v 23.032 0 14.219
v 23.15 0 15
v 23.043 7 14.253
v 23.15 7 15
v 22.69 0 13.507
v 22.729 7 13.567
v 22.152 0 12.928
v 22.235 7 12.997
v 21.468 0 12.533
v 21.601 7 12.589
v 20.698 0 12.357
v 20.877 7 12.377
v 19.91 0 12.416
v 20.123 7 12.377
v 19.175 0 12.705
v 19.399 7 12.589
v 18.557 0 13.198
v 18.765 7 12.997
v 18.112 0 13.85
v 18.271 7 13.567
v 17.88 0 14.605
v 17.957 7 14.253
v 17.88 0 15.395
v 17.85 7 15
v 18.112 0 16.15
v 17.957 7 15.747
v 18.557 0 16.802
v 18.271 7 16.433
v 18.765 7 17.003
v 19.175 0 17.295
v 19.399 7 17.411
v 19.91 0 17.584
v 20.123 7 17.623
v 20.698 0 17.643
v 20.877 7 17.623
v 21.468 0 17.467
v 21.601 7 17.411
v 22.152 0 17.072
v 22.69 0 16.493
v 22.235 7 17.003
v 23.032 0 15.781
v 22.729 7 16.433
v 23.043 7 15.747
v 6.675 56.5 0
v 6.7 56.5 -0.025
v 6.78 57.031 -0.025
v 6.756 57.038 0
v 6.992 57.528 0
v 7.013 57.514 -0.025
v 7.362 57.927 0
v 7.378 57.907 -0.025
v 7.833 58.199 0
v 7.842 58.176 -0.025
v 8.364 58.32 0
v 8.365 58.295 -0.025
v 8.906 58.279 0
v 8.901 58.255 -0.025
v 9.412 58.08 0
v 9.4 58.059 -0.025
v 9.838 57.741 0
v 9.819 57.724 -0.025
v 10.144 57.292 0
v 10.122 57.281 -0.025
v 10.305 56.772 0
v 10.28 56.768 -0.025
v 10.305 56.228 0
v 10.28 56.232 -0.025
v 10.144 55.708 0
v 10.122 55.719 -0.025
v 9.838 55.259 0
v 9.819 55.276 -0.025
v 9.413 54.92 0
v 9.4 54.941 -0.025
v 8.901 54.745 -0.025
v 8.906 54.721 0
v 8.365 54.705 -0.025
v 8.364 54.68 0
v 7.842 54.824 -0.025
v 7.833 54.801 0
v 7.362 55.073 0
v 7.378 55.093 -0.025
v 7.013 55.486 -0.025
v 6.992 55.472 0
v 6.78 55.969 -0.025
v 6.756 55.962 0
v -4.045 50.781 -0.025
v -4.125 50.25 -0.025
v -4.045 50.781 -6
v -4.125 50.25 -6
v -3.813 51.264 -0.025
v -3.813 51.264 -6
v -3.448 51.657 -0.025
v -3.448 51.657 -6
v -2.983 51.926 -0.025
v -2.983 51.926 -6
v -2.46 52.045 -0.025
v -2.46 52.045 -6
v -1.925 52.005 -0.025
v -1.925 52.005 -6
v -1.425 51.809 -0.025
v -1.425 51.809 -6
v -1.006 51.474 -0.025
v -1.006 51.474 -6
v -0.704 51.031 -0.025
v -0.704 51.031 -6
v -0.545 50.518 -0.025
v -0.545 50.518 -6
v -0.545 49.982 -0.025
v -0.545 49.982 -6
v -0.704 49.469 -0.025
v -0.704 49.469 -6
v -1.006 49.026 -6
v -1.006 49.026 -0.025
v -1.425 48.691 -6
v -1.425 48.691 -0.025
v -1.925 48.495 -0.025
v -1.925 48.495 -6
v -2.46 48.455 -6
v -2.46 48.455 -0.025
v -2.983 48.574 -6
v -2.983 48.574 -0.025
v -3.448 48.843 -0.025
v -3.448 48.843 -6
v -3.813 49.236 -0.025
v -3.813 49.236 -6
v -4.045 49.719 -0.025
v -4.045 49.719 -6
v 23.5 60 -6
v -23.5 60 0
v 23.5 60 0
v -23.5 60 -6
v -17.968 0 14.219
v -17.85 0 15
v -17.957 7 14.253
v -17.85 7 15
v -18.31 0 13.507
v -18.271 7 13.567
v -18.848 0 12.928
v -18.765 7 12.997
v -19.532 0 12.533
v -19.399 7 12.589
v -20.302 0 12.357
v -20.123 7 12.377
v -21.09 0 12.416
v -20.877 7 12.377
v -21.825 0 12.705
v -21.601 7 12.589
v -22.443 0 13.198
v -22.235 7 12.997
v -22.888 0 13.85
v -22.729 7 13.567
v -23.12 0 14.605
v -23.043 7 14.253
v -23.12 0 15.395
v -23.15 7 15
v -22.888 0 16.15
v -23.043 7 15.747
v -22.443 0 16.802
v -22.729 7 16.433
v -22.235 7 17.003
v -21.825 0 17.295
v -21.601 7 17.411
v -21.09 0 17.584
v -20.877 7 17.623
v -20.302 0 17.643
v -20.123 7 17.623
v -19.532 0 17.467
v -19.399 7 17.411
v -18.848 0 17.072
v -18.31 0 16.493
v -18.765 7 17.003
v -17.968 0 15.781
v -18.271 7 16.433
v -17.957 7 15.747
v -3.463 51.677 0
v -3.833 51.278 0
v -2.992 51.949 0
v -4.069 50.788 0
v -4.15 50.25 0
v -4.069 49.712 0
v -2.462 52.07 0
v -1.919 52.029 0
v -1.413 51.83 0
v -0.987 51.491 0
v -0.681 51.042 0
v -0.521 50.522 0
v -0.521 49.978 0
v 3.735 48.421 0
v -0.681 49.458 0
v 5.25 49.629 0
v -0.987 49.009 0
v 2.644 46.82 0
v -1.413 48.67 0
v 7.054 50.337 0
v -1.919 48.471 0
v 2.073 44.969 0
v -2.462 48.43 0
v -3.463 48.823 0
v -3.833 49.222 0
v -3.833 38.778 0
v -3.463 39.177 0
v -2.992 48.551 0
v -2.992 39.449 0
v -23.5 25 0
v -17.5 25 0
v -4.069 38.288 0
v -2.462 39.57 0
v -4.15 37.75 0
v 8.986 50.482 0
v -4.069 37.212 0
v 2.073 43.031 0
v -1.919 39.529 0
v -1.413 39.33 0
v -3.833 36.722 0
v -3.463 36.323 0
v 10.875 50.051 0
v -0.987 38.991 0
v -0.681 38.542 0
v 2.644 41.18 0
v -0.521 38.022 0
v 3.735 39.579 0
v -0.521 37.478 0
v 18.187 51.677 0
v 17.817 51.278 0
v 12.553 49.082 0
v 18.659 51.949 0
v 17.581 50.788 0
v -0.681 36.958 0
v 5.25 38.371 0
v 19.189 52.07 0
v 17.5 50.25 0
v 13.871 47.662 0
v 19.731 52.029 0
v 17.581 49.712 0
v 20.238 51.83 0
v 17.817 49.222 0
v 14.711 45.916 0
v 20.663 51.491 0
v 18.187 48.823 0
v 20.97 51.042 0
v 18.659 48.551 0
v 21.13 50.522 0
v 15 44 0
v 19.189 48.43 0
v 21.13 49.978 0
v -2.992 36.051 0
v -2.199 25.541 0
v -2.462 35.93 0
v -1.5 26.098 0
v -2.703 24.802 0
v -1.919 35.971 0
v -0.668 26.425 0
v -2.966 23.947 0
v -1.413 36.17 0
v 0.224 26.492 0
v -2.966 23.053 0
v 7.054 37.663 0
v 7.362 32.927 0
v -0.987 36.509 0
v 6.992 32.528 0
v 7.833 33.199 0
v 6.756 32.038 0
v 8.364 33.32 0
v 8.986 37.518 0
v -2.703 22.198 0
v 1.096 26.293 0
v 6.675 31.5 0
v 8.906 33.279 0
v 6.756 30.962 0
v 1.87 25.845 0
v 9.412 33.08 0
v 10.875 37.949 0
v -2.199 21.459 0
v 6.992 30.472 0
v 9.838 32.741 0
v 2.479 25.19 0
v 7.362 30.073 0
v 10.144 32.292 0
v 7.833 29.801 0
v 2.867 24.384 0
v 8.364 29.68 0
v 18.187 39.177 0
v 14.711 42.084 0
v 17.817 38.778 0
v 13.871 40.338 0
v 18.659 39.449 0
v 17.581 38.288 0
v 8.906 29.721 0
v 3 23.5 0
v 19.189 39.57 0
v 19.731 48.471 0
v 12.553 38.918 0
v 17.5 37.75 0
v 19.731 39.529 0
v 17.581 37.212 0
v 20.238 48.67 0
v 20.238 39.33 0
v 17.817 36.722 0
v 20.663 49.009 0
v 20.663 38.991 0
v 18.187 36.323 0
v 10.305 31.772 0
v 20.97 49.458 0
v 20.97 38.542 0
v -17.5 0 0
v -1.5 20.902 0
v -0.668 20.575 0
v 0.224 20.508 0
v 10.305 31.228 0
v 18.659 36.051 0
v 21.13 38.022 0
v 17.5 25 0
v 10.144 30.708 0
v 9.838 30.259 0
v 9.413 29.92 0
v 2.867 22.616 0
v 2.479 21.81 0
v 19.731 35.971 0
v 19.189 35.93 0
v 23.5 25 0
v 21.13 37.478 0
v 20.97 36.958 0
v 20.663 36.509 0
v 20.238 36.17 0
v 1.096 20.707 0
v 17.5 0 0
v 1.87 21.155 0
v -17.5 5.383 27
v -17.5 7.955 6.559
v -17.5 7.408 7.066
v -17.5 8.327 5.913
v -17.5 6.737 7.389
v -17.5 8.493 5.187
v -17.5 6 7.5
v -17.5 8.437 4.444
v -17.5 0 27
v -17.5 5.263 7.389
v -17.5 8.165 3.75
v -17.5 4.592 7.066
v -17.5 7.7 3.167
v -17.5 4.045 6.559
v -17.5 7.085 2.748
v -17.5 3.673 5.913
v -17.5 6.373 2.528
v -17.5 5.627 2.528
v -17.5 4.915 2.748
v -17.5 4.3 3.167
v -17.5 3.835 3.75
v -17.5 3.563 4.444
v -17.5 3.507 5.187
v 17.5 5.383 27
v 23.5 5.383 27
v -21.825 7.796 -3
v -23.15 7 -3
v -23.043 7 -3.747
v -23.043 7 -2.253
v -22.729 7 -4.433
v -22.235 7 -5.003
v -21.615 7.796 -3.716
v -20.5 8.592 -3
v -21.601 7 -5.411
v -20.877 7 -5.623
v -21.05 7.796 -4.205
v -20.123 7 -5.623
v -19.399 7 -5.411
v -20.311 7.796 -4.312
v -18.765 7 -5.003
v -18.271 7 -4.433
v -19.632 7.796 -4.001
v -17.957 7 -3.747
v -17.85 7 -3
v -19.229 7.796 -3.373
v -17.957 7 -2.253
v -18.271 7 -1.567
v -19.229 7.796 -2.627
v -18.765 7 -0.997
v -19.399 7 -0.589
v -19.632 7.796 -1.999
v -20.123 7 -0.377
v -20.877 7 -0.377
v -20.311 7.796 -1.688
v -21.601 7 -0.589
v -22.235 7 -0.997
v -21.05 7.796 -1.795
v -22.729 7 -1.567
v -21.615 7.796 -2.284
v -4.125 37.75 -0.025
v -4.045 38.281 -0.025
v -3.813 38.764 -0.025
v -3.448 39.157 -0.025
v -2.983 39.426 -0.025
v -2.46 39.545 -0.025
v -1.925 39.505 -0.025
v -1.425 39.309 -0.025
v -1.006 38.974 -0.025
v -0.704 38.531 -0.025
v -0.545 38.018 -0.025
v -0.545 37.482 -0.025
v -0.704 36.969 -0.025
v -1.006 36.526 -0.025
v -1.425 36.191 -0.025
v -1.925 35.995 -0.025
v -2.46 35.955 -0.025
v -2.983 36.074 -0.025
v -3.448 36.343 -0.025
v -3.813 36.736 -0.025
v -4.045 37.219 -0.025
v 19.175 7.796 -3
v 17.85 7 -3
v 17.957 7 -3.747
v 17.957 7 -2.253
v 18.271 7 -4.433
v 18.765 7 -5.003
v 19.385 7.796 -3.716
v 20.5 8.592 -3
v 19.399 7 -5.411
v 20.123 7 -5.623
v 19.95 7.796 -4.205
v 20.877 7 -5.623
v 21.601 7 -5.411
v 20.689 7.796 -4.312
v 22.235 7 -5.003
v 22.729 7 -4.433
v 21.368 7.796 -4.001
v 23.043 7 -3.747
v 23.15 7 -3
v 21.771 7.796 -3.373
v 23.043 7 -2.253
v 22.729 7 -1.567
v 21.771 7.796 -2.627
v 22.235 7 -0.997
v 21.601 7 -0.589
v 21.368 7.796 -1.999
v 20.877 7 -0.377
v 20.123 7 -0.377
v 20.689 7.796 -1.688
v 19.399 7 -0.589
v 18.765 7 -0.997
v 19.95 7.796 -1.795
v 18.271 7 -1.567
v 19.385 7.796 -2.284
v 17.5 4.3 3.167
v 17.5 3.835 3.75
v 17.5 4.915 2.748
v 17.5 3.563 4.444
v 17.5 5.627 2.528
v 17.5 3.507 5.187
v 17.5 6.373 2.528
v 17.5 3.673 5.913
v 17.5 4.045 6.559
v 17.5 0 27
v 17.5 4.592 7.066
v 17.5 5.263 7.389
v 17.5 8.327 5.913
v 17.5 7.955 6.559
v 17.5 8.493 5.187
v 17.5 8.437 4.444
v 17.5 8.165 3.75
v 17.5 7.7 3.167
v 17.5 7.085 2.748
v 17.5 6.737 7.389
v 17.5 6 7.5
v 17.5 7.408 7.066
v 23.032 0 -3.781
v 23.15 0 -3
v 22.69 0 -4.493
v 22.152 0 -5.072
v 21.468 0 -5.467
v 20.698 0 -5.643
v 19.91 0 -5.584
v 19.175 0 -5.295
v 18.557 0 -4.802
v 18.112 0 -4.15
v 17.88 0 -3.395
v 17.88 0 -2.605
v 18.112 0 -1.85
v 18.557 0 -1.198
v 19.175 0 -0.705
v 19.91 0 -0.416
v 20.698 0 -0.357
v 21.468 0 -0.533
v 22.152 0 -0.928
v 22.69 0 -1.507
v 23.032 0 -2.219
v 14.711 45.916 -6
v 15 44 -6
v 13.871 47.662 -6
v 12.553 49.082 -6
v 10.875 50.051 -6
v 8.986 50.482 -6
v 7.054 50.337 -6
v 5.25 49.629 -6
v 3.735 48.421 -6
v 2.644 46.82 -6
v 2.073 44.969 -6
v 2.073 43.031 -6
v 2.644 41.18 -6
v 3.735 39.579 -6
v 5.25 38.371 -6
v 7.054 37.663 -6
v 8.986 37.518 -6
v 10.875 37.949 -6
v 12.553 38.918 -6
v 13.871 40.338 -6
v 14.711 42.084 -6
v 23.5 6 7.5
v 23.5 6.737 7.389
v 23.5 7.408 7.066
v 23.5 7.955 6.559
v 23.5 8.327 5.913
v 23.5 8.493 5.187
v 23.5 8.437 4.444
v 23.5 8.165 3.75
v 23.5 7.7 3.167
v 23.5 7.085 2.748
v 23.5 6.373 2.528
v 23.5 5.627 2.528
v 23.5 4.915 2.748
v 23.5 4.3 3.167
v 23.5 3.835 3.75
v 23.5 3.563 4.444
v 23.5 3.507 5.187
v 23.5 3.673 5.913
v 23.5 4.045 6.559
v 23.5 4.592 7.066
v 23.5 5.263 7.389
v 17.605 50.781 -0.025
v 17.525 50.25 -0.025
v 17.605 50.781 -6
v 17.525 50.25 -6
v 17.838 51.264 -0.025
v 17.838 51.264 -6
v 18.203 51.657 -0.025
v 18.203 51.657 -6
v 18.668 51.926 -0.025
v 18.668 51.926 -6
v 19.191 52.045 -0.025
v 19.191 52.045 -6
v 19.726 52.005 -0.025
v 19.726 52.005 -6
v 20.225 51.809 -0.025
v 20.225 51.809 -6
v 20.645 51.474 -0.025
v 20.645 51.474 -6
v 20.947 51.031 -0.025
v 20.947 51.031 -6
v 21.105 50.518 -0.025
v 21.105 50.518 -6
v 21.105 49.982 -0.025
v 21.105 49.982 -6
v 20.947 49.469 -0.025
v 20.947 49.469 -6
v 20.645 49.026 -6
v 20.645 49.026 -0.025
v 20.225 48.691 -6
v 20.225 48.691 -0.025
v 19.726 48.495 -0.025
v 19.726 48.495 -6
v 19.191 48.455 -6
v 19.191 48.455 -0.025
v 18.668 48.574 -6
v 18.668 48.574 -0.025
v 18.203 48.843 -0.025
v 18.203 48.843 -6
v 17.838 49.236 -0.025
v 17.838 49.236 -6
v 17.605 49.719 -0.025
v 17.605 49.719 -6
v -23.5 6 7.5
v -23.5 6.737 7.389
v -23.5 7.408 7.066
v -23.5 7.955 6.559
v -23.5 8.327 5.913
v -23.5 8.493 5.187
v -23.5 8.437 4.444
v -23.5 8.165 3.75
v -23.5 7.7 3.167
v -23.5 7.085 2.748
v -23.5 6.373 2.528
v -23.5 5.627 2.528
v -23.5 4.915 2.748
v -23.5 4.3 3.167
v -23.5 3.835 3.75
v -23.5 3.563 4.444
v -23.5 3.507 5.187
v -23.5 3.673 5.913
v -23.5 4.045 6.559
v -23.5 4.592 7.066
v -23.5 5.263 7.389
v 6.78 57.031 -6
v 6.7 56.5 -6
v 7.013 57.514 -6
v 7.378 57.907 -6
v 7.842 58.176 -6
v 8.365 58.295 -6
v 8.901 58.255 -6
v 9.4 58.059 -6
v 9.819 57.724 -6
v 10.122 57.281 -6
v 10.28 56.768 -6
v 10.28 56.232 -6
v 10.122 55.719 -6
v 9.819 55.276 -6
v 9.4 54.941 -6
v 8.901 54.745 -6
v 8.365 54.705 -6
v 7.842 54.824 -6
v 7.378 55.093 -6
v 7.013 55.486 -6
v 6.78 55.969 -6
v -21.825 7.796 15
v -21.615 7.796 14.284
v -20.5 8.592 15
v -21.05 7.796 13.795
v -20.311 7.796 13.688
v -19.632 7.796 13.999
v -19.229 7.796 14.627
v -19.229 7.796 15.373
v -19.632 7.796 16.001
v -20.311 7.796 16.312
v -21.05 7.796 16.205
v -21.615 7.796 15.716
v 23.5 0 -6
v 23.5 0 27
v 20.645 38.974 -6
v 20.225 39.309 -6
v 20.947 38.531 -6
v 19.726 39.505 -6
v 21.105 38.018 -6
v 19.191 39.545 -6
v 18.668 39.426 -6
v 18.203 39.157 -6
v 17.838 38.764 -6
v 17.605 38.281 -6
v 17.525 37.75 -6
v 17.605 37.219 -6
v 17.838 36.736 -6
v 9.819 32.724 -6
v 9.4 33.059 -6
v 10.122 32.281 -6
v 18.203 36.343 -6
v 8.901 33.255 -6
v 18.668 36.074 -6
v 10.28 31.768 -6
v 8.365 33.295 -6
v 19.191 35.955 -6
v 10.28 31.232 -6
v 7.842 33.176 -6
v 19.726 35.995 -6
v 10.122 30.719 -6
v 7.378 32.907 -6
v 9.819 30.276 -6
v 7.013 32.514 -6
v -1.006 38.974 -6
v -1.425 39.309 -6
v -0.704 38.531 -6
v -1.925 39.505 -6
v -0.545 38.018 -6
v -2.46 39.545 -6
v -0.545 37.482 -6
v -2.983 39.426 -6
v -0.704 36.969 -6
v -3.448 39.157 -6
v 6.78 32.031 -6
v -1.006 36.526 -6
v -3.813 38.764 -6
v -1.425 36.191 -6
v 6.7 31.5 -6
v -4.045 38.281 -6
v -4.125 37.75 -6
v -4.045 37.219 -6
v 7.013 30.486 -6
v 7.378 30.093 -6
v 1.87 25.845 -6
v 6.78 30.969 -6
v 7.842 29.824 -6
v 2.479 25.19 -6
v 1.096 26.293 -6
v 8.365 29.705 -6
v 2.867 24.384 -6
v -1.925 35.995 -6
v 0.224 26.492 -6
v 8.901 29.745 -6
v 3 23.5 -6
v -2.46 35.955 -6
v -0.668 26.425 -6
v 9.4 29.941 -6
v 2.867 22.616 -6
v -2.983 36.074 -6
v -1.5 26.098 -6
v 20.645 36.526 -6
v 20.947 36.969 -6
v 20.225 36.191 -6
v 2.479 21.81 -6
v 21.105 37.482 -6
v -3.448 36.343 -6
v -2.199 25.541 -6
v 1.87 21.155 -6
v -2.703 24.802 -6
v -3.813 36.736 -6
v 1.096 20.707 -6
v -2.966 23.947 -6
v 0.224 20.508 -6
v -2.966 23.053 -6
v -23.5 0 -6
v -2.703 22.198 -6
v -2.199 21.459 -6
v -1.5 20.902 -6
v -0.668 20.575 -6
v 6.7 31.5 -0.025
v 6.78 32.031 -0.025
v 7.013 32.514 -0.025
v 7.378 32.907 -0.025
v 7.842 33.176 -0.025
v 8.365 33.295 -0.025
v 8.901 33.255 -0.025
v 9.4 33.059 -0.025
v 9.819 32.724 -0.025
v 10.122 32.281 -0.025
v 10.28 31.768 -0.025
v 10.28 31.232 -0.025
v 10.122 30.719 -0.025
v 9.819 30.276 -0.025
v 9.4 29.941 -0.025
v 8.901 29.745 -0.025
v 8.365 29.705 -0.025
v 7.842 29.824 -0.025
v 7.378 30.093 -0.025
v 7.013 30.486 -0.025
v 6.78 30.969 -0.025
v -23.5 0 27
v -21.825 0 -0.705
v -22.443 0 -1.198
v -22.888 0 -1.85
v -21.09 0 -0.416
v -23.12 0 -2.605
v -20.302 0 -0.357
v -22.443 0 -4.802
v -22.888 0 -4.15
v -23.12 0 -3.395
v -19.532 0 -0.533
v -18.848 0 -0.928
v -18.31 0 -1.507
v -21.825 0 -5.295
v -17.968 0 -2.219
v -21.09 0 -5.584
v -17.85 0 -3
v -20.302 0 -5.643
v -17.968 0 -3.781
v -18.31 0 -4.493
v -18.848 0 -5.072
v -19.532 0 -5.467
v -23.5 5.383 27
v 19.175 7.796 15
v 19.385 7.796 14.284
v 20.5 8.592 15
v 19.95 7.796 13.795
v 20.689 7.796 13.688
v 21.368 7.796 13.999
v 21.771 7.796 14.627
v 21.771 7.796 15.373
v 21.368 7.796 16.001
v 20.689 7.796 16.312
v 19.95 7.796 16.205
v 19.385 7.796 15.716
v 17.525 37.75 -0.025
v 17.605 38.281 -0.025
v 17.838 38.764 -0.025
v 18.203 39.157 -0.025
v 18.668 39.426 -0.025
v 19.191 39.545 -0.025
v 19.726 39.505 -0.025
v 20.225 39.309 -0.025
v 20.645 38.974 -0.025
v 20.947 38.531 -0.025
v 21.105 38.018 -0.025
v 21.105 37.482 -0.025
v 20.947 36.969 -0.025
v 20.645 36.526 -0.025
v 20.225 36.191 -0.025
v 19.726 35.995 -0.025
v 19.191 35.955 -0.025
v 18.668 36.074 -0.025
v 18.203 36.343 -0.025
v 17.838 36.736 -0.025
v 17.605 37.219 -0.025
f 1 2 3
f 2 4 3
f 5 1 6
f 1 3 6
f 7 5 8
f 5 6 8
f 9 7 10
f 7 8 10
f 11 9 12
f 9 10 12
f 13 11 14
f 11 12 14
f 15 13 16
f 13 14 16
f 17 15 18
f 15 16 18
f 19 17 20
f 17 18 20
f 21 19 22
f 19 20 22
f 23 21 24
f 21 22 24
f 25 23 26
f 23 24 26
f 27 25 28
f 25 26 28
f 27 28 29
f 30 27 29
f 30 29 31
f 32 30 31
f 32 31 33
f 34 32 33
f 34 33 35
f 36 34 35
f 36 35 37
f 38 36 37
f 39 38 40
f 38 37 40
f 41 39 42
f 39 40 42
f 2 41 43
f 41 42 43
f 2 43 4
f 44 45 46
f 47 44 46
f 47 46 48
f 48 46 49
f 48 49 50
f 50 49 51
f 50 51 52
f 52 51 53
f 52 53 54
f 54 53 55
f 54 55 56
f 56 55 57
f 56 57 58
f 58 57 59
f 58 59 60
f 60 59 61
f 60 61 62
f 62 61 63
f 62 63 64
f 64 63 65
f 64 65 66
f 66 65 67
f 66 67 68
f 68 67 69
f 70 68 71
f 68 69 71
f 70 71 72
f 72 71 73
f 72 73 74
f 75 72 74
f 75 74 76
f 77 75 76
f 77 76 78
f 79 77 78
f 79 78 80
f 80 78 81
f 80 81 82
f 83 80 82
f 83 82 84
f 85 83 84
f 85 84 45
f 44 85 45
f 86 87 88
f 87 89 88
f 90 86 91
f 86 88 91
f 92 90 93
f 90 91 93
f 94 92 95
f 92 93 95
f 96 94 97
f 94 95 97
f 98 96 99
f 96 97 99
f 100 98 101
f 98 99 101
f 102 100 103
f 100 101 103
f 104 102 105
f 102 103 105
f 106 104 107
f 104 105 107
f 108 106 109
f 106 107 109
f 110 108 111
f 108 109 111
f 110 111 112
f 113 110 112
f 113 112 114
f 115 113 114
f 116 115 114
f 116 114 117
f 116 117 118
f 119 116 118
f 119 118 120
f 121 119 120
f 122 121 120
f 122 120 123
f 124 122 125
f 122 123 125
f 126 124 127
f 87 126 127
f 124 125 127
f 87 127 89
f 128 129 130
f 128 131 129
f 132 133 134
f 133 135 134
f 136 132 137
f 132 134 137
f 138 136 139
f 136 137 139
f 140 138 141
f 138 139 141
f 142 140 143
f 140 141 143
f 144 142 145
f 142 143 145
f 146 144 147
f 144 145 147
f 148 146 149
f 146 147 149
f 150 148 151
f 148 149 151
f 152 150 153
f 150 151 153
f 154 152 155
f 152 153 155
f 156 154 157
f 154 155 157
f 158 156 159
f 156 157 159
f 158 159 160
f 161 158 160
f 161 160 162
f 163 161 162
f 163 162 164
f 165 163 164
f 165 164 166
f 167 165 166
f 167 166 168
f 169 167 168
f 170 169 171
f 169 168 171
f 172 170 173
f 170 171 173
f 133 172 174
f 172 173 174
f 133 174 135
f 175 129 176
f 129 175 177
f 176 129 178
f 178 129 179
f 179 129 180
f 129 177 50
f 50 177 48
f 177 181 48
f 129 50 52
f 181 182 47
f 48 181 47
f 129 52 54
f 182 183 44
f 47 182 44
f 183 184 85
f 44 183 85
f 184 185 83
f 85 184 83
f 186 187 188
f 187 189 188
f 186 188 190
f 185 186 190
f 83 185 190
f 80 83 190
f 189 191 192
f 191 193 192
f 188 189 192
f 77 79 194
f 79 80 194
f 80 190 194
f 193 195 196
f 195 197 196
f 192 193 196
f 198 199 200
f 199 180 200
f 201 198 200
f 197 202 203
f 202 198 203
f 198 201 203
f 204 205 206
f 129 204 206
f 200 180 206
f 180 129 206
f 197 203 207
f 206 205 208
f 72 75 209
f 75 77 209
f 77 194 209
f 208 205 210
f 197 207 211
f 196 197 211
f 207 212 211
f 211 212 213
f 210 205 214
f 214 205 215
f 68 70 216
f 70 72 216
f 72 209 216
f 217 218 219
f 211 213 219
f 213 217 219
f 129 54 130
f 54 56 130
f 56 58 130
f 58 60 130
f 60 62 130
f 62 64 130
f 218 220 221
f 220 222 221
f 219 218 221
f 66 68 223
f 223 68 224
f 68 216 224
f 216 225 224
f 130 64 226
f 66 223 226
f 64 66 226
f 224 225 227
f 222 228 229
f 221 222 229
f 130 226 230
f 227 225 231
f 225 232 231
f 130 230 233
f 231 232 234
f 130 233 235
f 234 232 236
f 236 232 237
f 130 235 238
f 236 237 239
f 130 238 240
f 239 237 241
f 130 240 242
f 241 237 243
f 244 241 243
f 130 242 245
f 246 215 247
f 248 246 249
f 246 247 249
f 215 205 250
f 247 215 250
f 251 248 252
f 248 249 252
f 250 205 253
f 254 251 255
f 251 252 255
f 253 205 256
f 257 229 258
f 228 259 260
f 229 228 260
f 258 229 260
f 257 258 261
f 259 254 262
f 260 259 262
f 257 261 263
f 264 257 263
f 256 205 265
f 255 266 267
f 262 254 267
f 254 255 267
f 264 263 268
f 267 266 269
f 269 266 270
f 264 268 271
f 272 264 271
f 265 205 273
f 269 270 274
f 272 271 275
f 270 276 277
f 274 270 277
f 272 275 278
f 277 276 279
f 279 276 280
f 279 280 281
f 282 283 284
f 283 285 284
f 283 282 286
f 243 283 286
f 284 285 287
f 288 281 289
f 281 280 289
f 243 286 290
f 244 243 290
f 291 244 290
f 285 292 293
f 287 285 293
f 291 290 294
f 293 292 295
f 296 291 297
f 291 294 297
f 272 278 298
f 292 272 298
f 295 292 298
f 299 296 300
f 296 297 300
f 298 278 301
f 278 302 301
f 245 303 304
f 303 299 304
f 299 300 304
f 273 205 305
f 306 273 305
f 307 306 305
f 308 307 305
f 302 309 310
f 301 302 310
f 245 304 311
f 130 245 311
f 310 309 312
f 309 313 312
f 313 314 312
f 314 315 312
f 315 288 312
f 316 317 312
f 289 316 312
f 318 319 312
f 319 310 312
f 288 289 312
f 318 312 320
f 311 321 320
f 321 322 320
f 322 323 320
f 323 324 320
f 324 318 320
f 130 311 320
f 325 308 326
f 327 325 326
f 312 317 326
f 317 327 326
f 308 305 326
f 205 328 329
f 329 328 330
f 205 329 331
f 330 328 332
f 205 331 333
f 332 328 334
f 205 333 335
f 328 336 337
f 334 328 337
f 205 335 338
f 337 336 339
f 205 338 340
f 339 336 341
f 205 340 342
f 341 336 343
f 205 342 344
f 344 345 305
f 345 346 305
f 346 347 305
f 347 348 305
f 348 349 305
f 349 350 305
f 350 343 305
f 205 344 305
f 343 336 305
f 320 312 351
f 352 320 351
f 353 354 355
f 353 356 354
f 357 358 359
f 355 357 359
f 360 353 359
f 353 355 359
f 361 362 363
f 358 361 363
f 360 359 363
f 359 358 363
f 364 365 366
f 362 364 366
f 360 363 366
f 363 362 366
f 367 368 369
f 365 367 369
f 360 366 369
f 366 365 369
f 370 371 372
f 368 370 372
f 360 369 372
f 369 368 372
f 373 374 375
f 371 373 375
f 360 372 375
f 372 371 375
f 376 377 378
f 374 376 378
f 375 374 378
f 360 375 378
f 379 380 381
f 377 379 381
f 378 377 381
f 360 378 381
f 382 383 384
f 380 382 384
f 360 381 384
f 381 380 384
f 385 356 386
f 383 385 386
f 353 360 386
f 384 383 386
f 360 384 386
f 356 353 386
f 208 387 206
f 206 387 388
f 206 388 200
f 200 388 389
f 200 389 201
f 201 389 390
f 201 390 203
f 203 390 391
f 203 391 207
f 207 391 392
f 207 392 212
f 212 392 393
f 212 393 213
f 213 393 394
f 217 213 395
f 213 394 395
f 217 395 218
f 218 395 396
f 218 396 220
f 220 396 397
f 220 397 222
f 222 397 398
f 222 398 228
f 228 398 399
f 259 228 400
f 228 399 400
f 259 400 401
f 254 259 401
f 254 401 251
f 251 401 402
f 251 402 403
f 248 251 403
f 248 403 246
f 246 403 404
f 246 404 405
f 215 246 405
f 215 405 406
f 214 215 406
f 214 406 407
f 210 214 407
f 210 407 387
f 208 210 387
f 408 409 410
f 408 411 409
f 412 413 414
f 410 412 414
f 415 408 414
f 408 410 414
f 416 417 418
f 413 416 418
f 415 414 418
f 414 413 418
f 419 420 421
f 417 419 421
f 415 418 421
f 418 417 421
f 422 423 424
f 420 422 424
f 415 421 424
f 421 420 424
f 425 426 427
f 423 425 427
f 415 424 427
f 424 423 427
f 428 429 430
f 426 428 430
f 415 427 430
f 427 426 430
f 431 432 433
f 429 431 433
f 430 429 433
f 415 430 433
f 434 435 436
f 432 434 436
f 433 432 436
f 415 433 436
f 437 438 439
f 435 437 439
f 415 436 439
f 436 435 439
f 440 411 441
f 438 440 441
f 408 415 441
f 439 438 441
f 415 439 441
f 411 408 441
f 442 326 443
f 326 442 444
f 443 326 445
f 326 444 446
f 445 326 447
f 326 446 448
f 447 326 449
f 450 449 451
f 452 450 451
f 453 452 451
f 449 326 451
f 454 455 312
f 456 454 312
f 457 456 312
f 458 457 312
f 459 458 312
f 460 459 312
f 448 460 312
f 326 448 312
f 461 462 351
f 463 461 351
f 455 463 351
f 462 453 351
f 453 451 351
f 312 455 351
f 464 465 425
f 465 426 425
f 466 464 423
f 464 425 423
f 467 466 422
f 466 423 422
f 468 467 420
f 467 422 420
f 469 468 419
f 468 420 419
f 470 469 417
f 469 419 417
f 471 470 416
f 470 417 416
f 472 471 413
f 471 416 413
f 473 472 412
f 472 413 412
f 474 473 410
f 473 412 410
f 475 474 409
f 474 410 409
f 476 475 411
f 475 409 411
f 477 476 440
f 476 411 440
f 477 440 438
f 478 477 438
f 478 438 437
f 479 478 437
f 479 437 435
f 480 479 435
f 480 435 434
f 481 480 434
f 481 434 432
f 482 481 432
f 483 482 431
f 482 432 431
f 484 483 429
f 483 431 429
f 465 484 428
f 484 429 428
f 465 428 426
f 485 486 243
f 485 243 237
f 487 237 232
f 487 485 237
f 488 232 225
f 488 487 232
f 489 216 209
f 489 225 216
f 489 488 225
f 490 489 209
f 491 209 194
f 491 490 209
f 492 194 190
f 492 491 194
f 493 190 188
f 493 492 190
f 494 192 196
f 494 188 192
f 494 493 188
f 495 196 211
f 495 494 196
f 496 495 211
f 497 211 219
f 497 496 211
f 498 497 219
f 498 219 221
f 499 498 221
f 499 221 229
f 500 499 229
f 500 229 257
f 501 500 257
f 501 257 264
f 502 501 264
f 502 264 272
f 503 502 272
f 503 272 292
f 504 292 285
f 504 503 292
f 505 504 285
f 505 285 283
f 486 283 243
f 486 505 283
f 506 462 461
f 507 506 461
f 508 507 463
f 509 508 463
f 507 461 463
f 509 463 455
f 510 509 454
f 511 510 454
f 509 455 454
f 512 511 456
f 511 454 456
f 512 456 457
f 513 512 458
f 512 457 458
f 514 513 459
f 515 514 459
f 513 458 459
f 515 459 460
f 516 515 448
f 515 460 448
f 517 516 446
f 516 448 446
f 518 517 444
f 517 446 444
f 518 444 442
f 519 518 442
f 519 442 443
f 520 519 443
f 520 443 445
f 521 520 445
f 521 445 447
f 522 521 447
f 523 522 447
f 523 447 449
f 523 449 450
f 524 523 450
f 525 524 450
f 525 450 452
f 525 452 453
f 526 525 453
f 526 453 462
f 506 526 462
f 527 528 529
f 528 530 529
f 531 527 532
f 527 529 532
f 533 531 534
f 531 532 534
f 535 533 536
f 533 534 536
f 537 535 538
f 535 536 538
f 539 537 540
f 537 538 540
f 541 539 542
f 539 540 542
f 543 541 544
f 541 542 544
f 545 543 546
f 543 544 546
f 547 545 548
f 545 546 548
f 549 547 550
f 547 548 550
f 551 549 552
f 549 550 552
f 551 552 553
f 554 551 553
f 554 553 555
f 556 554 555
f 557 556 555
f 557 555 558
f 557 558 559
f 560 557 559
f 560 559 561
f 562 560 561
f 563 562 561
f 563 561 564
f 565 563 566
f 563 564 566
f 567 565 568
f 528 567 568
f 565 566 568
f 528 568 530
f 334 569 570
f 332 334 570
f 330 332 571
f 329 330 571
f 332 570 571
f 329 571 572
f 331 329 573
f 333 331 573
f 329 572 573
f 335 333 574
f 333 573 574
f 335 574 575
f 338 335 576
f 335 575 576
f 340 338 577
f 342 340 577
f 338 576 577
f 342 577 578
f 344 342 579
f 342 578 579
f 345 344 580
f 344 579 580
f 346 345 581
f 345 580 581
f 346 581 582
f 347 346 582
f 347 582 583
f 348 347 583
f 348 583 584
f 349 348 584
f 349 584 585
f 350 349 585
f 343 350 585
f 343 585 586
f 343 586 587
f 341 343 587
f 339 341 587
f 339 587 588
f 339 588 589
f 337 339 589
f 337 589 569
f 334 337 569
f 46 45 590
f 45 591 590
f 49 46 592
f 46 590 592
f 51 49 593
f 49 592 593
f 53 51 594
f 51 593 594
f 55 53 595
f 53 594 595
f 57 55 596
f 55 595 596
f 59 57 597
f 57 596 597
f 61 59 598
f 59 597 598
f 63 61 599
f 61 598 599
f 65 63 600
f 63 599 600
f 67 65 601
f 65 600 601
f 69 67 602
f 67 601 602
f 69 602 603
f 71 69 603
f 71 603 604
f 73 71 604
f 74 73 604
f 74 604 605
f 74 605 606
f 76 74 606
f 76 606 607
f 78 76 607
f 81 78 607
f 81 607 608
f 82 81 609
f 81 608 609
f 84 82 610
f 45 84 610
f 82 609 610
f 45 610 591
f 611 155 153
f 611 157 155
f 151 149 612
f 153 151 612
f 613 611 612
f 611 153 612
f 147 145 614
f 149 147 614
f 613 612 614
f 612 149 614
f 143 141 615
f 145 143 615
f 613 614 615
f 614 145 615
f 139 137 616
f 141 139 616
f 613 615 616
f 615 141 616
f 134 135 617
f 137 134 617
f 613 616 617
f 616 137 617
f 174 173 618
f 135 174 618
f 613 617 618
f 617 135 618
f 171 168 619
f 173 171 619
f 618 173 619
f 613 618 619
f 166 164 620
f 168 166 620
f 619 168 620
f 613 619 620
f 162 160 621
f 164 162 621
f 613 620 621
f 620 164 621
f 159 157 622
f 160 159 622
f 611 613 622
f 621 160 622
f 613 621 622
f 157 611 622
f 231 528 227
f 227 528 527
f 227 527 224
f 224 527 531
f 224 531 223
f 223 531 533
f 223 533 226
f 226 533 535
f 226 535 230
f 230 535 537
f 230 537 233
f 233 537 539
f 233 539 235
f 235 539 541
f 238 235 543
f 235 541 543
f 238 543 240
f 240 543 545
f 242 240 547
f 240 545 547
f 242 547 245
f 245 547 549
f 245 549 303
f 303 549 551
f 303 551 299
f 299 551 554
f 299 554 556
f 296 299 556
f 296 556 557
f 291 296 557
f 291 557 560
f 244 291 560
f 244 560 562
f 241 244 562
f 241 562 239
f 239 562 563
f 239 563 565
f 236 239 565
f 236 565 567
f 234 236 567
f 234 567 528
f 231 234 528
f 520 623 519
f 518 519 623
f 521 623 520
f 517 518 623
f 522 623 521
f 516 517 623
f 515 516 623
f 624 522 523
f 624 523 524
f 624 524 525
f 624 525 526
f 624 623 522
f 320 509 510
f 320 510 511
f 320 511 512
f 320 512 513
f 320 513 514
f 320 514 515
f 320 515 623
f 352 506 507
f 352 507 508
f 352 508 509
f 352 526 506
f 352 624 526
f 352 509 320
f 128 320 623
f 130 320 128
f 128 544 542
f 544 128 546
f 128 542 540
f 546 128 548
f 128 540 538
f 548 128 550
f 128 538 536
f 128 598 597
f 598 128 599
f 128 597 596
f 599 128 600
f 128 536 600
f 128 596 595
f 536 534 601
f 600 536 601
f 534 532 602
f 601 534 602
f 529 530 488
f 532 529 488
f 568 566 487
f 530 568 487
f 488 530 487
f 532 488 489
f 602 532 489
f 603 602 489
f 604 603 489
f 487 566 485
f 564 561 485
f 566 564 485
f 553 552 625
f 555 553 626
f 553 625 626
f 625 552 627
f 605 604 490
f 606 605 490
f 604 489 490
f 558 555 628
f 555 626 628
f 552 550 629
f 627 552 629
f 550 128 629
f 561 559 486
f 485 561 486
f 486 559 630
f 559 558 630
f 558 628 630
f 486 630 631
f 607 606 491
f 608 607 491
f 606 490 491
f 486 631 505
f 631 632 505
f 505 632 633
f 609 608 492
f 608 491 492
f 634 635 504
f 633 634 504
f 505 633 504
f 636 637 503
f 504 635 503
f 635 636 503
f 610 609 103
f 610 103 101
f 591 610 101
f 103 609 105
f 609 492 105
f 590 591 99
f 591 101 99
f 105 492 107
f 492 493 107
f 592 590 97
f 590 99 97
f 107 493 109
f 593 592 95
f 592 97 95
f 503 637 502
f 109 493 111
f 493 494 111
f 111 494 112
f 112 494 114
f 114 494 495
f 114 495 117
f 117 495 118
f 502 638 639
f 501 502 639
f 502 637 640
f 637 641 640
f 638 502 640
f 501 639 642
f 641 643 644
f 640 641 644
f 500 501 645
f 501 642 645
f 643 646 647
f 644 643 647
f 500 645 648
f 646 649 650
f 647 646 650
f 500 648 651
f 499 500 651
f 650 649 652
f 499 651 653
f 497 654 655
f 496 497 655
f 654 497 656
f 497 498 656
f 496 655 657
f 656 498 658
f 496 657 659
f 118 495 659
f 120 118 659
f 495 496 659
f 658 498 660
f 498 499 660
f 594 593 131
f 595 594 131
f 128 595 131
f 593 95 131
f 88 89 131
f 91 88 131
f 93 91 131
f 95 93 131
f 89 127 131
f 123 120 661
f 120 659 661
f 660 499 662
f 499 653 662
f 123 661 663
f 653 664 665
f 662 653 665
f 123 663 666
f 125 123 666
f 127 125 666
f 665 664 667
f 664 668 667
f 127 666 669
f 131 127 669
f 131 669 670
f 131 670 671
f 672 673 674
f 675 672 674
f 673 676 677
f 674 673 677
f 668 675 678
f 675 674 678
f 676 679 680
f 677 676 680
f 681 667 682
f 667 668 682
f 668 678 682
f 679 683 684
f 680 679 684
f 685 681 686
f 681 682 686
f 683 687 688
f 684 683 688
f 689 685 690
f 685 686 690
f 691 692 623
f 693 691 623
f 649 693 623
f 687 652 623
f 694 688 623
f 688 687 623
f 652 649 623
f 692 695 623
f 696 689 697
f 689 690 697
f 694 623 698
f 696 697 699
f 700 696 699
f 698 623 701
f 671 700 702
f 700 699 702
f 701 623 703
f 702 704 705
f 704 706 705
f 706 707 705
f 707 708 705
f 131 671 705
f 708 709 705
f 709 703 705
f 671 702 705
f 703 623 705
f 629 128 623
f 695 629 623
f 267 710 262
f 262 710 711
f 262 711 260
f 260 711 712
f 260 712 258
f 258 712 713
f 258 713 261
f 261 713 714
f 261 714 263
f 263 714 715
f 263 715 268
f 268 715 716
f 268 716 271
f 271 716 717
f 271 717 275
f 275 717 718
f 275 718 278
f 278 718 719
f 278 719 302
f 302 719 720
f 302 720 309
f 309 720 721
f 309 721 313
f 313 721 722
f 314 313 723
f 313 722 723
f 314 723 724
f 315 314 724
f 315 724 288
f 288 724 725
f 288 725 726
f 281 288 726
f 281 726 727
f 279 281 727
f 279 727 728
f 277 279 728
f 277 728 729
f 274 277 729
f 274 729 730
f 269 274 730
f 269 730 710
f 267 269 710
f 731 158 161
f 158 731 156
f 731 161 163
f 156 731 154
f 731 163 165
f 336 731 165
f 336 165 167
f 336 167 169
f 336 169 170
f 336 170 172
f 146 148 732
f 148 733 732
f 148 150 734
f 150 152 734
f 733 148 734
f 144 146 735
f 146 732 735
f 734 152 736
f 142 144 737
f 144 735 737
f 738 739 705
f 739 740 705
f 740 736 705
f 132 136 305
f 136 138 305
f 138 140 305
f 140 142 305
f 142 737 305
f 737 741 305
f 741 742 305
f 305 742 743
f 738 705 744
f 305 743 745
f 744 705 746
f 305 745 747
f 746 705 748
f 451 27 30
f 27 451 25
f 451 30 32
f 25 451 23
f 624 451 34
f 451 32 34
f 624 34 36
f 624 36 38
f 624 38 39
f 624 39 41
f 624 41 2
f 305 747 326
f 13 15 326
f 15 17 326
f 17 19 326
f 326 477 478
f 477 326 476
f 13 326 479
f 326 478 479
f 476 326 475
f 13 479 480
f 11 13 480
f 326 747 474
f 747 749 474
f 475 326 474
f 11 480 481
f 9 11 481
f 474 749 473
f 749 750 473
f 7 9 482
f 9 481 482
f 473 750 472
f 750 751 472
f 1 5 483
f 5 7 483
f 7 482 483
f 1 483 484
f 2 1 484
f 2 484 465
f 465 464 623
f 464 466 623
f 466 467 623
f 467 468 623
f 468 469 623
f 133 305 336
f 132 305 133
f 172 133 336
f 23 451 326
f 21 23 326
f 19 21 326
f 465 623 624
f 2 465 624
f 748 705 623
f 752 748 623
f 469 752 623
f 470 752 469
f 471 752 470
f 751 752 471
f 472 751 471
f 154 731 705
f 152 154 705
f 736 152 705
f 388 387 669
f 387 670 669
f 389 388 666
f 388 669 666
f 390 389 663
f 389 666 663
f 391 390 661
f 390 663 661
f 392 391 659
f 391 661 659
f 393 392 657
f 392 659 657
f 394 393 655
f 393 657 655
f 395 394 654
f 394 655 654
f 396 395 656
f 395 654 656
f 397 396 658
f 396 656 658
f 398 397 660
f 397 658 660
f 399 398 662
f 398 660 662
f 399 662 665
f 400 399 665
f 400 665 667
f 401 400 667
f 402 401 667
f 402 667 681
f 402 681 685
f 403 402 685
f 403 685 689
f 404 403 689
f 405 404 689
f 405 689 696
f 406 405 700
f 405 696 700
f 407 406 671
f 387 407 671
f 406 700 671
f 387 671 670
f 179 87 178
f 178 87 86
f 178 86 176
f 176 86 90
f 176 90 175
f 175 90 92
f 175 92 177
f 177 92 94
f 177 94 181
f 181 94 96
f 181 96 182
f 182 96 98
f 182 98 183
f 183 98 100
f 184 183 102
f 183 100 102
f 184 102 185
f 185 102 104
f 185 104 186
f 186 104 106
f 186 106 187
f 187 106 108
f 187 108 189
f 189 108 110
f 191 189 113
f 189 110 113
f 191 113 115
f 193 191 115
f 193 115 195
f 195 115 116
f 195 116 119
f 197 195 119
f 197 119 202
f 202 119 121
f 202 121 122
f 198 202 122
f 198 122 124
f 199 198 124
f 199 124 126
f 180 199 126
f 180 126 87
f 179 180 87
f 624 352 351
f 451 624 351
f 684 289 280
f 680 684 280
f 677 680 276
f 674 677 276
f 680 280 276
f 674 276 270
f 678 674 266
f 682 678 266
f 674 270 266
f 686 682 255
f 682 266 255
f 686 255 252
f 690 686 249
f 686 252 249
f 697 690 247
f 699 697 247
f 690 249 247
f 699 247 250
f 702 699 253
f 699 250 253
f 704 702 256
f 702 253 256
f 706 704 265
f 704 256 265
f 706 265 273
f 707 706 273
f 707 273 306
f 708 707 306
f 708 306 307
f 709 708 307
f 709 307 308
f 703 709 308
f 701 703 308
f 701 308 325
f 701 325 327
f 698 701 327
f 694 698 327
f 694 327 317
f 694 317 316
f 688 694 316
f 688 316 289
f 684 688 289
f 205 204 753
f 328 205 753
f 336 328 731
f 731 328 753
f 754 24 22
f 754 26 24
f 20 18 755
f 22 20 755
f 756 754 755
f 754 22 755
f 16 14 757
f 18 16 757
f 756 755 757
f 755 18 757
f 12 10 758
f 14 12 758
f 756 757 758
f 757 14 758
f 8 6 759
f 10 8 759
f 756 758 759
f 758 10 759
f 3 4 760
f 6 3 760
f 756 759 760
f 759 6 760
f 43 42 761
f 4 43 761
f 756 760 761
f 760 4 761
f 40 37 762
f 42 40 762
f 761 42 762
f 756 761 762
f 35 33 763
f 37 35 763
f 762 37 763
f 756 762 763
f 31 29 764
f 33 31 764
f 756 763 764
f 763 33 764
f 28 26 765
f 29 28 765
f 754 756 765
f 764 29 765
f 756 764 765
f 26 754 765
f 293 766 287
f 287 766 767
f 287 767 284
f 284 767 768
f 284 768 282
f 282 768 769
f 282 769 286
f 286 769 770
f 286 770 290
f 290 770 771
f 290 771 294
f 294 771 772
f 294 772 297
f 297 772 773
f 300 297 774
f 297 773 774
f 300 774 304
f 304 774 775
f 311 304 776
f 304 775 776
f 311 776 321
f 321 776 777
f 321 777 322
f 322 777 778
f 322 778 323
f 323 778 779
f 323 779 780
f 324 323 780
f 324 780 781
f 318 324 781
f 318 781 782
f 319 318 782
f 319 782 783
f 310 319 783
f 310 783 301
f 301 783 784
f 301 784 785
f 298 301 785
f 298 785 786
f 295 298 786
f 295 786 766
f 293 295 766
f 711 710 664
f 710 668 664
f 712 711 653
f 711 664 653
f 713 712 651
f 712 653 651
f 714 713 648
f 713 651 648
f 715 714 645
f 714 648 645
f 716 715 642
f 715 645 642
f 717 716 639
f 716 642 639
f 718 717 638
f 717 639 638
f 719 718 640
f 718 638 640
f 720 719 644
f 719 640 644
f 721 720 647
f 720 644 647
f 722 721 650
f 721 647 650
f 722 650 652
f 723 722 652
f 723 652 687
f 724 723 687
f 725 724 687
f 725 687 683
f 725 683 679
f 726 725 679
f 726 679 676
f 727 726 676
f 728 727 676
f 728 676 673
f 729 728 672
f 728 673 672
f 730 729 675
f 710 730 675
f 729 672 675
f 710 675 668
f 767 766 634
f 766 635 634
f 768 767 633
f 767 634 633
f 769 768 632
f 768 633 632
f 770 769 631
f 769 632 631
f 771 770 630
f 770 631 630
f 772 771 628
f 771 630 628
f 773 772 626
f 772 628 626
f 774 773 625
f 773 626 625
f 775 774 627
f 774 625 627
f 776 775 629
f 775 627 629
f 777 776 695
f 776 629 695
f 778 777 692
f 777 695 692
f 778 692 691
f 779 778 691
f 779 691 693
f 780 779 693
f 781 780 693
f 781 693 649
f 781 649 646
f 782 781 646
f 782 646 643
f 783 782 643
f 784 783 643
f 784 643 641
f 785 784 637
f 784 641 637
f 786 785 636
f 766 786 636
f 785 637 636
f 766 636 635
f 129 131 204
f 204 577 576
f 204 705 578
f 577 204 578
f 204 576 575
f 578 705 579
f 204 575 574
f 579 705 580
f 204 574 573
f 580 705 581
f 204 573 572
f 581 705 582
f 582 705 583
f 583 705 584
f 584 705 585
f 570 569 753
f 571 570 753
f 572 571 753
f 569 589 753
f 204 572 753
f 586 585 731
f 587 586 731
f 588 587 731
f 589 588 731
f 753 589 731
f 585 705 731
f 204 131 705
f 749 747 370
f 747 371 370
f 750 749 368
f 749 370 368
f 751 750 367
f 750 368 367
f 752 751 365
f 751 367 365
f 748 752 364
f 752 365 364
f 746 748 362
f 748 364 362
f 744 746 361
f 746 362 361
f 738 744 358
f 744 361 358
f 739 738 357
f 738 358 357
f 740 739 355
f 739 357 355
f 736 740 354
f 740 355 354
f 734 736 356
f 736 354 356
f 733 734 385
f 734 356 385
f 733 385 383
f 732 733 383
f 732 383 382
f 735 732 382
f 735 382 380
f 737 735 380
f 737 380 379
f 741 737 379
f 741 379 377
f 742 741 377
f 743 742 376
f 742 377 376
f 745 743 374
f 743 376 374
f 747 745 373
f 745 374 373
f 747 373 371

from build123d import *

# Parameters (mm, degrees)
SKETCH1_W                      = 6
SKETCH1_H                      = 27
BOSS_EXTRUDE1_DEPTH            = 5
BOSS_EXTRUDE2_START            = 5
BOSS_EXTRUDE2_DEPTH            = 55
CHAMFER1_SIZE                  = 20
CHAMFER1_SIZE_2                = 27.527638409
M3_CLEARANCE_HOLE1_D           = 3.6
M3_CLEARANCE_HOLE1_CSINK_D     = 3.65
M3_CLEARANCE_HOLE1_CSINK_ANGLE = 90
CUT_EXTRUDE1_DEPTH             = 70.865943062
CUT_EXTRUDE1_DEPTH_BACK        = 70.865943062
SKETCH4_R                      = 6.5
F_5_3_5_3_DIAMETER_HOLE1_D     = 5.3
F_5_3_5_3_DIAMETER_HOLE1_DEPTH = 7
F_5_3_5_3_DIAMETER_HOLE1_TIP   = 1.59228064
SKETCH10_R                     = 3
CUT_EXTRUDE2_DEPTH             = 10
SKETCH11_R                     = 2.5
CUT_EXTRUDE3_DEPTH             = 81.857900047


with BuildPart() as part:
    # Sketch1 → Boss-Extrude1 (new body)
    with BuildSketch(Plane(origin=(0, 0, 0), x_dir=(1, 0, 0), z_dir=(0, 1, 0))):
        with Locations((-20.5, -13.5)):
            Rectangle(SKETCH1_W, SKETCH1_H)
        Polygon((-23.5, 0), (-17.5, 0), (17.5, 0), (23.5, 0), (23.5, 6), (-23.5, 6), align=None)
        with Locations((20.5, -13.5)):
            Rectangle(SKETCH1_W, SKETCH1_H)
    extrude(amount=BOSS_EXTRUDE1_DEPTH)

    # Sketch1<3> → Boss-Extrude2 (add)
    with BuildSketch(Plane(origin=(0, 0, 0), x_dir=(1, 0, 0), z_dir=(0, 1, 0)).offset(BOSS_EXTRUDE2_START)):
        Polygon((-23.5, 0), (-17.5, 0), (17.5, 0), (23.5, 0), (23.5, 6), (-23.5, 6), align=None)
    extrude(amount=BOSS_EXTRUDE2_DEPTH)

    # Chamfer1
    # the kernel refuses this chamfer: 27.527638409, 20 mm, written as the material it adds along each edge
    with BuildSketch(Plane(origin=(-53.564551252, 5, 0), x_dir=(0, 0.9990705747005859, -0.043104370630376254), z_dir=(1, 0, 0))) as chamfer1_piece_1_section:
        Polygon((CHAMFER1_SIZE * 0.999070574701, CHAMFER1_SIZE * 0.0431043706304), (-CHAMFER1_SIZE_2 * 0.043104370631, CHAMFER1_SIZE_2 * 0.999070574716), (0, 0), align=None)
    chamfer1_piece_1 = extrude(amount=77.064551252, mode=Mode.PRIVATE)
    chamfer1_piece_1 = split(chamfer1_piece_1, bisect_by=Plane(origin=(-23.5, 11.537219217, 9.073559483), z_dir=(1, 0, 0)), keep=Keep.TOP, mode=Mode.PRIVATE)
    chamfer1_piece_1 = split(chamfer1_piece_1, bisect_by=Plane(origin=(-17.5, 11.537219217, 9.073559483), z_dir=(-1, 0, 0)), keep=Keep.TOP, mode=Mode.PRIVATE)
    chamfer1_piece_1 = split(chamfer1_piece_1, bisect_by=Plane(origin=(-20.5, 11.537219217, 27), z_dir=(0, 0, -1)), keep=Keep.TOP, mode=Mode.PRIVATE)
    add(chamfer1_piece_1)
    with BuildSketch(Plane(origin=(17.5, 5, 0), x_dir=(0, 0.9990705747005859, -0.04310437063037649), z_dir=(1, 0, 0))) as chamfer1_piece_2_section:
        Polygon((CHAMFER1_SIZE * 0.999070574701, CHAMFER1_SIZE * 0.0431043706304), (-CHAMFER1_SIZE_2 * 0.043104370631, CHAMFER1_SIZE_2 * 0.999070574716), (0, 0), align=None)
    chamfer1_piece_2 = extrude(amount=6, mode=Mode.PRIVATE)
    chamfer1_piece_2 = split(chamfer1_piece_2, bisect_by=Plane(origin=(20.5, 11.537219217, 27), z_dir=(0, 0, -1)), keep=Keep.TOP, mode=Mode.PRIVATE)
    add(chamfer1_piece_2)
    with BuildSketch(Plane(origin=(-23.5, 5, 0), x_dir=(0, -0.022768510603911572, 0.9997407638607518), z_dir=(1, 0, 0))) as chamfer1_piece_3_section:
        Polygon((CHAMFER1_SIZE_2 * 0.999740763876, -CHAMFER1_SIZE_2 * 0.0227685106043), (-CHAMFER1_SIZE * 0.0227685106039, -CHAMFER1_SIZE * 0.999740763861), (0, 0), align=None)
    chamfer1_piece_3 = extrude(amount=6, mode=Mode.PRIVATE)
    chamfer1_piece_3 = split(chamfer1_piece_3, bisect_by=Plane(origin=(-20.5, 11.537219217, 27), z_dir=(0, 0, -1)), keep=Keep.TOP, mode=Mode.PRIVATE)
    add(chamfer1_piece_3)
    with BuildSketch(Plane(origin=(-23.5, 5, 0), x_dir=(0, -0.022768510603911572, 0.9997407638607518), z_dir=(1, 0, 0))) as chamfer1_piece_4_section:
        Polygon((CHAMFER1_SIZE_2 * 0.999740763876, -CHAMFER1_SIZE_2 * 0.0227685106043), (-CHAMFER1_SIZE * 0.0227685106039, -CHAMFER1_SIZE * 0.999740763861), (0, 0), align=None)
    chamfer1_piece_4 = extrude(amount=77.064551252, mode=Mode.PRIVATE)
    chamfer1_piece_4 = split(chamfer1_piece_4, bisect_by=Plane(origin=(20.5, 11.537219217, 27), z_dir=(0, 0, -1)), keep=Keep.TOP, mode=Mode.PRIVATE)
    chamfer1_piece_4 = split(chamfer1_piece_4, bisect_by=Plane(origin=(23.5, 11.537219217, 9.073559483), z_dir=(-1, 0, 0)), keep=Keep.TOP, mode=Mode.PRIVATE)
    chamfer1_piece_4 = split(chamfer1_piece_4, bisect_by=Plane(origin=(17.5, 11.537219217, 9.073559483), z_dir=(1, 0, 0)), keep=Keep.TOP, mode=Mode.PRIVATE)
    add(chamfer1_piece_4)

    # M3 Clearance Hole1 (through all)
    with Locations(Plane.XY):
        with Locations((8.5, 56.5), (19.325317547, 50.25), (19.325317547, 37.75), (8.5, 31.5), (-2.325317547, 37.75), (-2.325317547, 50.25)):
            CounterSinkHole(M3_CLEARANCE_HOLE1_D / 2, M3_CLEARANCE_HOLE1_CSINK_D / 2, counter_sink_angle=M3_CLEARANCE_HOLE1_CSINK_ANGLE)

    # Sketch4 → Cut-Extrude1 (cut, two sides: drawn at the far end of the back side and taken through both)
    with BuildSketch(Plane.XY.offset(-CUT_EXTRUDE1_DEPTH_BACK)):
        with Locations((8.5, 44)):
            Circle(SKETCH4_R)
    extrude(amount=CUT_EXTRUDE1_DEPTH + CUT_EXTRUDE1_DEPTH_BACK, mode=Mode.SUBTRACT)

    # Ø5.3 (5.3) Diameter Hole1
    with Locations(Plane(origin=(0, 0, 0), x_dir=(-1, 0, 0), z_dir=(0, -1, 0))):
        with Locations((-20.5, 3), (-20.5, -15), (20.5, 3), (20.5, -15)):
            Hole(F_5_3_5_3_DIAMETER_HOLE1_D / 2, depth=F_5_3_5_3_DIAMETER_HOLE1_DEPTH)
            with Locations((0, 0, -(F_5_3_5_3_DIAMETER_HOLE1_DEPTH + F_5_3_5_3_DIAMETER_HOLE1_TIP / 2))):  # 118° drill point
                Cone(0, F_5_3_5_3_DIAMETER_HOLE1_D / 2, F_5_3_5_3_DIAMETER_HOLE1_TIP, mode=Mode.SUBTRACT)

    # Sketch10 → Cut-Extrude2 (cut)
    with BuildSketch(Plane.XY):
        with Locations((0, 23.5)):
            Circle(SKETCH10_R)
    extrude(amount=-CUT_EXTRUDE2_DEPTH, mode=Mode.SUBTRACT)

    # Sketch11 → Cut-Extrude3 (cut, through all)
    with BuildSketch(Plane.ZY.offset(23.5)):
        with Locations((5, 6)):
            Circle(SKETCH11_R)
    extrude(amount=-CUT_EXTRUDE3_DEPTH, mode=Mode.SUBTRACT)


solid = part.part
